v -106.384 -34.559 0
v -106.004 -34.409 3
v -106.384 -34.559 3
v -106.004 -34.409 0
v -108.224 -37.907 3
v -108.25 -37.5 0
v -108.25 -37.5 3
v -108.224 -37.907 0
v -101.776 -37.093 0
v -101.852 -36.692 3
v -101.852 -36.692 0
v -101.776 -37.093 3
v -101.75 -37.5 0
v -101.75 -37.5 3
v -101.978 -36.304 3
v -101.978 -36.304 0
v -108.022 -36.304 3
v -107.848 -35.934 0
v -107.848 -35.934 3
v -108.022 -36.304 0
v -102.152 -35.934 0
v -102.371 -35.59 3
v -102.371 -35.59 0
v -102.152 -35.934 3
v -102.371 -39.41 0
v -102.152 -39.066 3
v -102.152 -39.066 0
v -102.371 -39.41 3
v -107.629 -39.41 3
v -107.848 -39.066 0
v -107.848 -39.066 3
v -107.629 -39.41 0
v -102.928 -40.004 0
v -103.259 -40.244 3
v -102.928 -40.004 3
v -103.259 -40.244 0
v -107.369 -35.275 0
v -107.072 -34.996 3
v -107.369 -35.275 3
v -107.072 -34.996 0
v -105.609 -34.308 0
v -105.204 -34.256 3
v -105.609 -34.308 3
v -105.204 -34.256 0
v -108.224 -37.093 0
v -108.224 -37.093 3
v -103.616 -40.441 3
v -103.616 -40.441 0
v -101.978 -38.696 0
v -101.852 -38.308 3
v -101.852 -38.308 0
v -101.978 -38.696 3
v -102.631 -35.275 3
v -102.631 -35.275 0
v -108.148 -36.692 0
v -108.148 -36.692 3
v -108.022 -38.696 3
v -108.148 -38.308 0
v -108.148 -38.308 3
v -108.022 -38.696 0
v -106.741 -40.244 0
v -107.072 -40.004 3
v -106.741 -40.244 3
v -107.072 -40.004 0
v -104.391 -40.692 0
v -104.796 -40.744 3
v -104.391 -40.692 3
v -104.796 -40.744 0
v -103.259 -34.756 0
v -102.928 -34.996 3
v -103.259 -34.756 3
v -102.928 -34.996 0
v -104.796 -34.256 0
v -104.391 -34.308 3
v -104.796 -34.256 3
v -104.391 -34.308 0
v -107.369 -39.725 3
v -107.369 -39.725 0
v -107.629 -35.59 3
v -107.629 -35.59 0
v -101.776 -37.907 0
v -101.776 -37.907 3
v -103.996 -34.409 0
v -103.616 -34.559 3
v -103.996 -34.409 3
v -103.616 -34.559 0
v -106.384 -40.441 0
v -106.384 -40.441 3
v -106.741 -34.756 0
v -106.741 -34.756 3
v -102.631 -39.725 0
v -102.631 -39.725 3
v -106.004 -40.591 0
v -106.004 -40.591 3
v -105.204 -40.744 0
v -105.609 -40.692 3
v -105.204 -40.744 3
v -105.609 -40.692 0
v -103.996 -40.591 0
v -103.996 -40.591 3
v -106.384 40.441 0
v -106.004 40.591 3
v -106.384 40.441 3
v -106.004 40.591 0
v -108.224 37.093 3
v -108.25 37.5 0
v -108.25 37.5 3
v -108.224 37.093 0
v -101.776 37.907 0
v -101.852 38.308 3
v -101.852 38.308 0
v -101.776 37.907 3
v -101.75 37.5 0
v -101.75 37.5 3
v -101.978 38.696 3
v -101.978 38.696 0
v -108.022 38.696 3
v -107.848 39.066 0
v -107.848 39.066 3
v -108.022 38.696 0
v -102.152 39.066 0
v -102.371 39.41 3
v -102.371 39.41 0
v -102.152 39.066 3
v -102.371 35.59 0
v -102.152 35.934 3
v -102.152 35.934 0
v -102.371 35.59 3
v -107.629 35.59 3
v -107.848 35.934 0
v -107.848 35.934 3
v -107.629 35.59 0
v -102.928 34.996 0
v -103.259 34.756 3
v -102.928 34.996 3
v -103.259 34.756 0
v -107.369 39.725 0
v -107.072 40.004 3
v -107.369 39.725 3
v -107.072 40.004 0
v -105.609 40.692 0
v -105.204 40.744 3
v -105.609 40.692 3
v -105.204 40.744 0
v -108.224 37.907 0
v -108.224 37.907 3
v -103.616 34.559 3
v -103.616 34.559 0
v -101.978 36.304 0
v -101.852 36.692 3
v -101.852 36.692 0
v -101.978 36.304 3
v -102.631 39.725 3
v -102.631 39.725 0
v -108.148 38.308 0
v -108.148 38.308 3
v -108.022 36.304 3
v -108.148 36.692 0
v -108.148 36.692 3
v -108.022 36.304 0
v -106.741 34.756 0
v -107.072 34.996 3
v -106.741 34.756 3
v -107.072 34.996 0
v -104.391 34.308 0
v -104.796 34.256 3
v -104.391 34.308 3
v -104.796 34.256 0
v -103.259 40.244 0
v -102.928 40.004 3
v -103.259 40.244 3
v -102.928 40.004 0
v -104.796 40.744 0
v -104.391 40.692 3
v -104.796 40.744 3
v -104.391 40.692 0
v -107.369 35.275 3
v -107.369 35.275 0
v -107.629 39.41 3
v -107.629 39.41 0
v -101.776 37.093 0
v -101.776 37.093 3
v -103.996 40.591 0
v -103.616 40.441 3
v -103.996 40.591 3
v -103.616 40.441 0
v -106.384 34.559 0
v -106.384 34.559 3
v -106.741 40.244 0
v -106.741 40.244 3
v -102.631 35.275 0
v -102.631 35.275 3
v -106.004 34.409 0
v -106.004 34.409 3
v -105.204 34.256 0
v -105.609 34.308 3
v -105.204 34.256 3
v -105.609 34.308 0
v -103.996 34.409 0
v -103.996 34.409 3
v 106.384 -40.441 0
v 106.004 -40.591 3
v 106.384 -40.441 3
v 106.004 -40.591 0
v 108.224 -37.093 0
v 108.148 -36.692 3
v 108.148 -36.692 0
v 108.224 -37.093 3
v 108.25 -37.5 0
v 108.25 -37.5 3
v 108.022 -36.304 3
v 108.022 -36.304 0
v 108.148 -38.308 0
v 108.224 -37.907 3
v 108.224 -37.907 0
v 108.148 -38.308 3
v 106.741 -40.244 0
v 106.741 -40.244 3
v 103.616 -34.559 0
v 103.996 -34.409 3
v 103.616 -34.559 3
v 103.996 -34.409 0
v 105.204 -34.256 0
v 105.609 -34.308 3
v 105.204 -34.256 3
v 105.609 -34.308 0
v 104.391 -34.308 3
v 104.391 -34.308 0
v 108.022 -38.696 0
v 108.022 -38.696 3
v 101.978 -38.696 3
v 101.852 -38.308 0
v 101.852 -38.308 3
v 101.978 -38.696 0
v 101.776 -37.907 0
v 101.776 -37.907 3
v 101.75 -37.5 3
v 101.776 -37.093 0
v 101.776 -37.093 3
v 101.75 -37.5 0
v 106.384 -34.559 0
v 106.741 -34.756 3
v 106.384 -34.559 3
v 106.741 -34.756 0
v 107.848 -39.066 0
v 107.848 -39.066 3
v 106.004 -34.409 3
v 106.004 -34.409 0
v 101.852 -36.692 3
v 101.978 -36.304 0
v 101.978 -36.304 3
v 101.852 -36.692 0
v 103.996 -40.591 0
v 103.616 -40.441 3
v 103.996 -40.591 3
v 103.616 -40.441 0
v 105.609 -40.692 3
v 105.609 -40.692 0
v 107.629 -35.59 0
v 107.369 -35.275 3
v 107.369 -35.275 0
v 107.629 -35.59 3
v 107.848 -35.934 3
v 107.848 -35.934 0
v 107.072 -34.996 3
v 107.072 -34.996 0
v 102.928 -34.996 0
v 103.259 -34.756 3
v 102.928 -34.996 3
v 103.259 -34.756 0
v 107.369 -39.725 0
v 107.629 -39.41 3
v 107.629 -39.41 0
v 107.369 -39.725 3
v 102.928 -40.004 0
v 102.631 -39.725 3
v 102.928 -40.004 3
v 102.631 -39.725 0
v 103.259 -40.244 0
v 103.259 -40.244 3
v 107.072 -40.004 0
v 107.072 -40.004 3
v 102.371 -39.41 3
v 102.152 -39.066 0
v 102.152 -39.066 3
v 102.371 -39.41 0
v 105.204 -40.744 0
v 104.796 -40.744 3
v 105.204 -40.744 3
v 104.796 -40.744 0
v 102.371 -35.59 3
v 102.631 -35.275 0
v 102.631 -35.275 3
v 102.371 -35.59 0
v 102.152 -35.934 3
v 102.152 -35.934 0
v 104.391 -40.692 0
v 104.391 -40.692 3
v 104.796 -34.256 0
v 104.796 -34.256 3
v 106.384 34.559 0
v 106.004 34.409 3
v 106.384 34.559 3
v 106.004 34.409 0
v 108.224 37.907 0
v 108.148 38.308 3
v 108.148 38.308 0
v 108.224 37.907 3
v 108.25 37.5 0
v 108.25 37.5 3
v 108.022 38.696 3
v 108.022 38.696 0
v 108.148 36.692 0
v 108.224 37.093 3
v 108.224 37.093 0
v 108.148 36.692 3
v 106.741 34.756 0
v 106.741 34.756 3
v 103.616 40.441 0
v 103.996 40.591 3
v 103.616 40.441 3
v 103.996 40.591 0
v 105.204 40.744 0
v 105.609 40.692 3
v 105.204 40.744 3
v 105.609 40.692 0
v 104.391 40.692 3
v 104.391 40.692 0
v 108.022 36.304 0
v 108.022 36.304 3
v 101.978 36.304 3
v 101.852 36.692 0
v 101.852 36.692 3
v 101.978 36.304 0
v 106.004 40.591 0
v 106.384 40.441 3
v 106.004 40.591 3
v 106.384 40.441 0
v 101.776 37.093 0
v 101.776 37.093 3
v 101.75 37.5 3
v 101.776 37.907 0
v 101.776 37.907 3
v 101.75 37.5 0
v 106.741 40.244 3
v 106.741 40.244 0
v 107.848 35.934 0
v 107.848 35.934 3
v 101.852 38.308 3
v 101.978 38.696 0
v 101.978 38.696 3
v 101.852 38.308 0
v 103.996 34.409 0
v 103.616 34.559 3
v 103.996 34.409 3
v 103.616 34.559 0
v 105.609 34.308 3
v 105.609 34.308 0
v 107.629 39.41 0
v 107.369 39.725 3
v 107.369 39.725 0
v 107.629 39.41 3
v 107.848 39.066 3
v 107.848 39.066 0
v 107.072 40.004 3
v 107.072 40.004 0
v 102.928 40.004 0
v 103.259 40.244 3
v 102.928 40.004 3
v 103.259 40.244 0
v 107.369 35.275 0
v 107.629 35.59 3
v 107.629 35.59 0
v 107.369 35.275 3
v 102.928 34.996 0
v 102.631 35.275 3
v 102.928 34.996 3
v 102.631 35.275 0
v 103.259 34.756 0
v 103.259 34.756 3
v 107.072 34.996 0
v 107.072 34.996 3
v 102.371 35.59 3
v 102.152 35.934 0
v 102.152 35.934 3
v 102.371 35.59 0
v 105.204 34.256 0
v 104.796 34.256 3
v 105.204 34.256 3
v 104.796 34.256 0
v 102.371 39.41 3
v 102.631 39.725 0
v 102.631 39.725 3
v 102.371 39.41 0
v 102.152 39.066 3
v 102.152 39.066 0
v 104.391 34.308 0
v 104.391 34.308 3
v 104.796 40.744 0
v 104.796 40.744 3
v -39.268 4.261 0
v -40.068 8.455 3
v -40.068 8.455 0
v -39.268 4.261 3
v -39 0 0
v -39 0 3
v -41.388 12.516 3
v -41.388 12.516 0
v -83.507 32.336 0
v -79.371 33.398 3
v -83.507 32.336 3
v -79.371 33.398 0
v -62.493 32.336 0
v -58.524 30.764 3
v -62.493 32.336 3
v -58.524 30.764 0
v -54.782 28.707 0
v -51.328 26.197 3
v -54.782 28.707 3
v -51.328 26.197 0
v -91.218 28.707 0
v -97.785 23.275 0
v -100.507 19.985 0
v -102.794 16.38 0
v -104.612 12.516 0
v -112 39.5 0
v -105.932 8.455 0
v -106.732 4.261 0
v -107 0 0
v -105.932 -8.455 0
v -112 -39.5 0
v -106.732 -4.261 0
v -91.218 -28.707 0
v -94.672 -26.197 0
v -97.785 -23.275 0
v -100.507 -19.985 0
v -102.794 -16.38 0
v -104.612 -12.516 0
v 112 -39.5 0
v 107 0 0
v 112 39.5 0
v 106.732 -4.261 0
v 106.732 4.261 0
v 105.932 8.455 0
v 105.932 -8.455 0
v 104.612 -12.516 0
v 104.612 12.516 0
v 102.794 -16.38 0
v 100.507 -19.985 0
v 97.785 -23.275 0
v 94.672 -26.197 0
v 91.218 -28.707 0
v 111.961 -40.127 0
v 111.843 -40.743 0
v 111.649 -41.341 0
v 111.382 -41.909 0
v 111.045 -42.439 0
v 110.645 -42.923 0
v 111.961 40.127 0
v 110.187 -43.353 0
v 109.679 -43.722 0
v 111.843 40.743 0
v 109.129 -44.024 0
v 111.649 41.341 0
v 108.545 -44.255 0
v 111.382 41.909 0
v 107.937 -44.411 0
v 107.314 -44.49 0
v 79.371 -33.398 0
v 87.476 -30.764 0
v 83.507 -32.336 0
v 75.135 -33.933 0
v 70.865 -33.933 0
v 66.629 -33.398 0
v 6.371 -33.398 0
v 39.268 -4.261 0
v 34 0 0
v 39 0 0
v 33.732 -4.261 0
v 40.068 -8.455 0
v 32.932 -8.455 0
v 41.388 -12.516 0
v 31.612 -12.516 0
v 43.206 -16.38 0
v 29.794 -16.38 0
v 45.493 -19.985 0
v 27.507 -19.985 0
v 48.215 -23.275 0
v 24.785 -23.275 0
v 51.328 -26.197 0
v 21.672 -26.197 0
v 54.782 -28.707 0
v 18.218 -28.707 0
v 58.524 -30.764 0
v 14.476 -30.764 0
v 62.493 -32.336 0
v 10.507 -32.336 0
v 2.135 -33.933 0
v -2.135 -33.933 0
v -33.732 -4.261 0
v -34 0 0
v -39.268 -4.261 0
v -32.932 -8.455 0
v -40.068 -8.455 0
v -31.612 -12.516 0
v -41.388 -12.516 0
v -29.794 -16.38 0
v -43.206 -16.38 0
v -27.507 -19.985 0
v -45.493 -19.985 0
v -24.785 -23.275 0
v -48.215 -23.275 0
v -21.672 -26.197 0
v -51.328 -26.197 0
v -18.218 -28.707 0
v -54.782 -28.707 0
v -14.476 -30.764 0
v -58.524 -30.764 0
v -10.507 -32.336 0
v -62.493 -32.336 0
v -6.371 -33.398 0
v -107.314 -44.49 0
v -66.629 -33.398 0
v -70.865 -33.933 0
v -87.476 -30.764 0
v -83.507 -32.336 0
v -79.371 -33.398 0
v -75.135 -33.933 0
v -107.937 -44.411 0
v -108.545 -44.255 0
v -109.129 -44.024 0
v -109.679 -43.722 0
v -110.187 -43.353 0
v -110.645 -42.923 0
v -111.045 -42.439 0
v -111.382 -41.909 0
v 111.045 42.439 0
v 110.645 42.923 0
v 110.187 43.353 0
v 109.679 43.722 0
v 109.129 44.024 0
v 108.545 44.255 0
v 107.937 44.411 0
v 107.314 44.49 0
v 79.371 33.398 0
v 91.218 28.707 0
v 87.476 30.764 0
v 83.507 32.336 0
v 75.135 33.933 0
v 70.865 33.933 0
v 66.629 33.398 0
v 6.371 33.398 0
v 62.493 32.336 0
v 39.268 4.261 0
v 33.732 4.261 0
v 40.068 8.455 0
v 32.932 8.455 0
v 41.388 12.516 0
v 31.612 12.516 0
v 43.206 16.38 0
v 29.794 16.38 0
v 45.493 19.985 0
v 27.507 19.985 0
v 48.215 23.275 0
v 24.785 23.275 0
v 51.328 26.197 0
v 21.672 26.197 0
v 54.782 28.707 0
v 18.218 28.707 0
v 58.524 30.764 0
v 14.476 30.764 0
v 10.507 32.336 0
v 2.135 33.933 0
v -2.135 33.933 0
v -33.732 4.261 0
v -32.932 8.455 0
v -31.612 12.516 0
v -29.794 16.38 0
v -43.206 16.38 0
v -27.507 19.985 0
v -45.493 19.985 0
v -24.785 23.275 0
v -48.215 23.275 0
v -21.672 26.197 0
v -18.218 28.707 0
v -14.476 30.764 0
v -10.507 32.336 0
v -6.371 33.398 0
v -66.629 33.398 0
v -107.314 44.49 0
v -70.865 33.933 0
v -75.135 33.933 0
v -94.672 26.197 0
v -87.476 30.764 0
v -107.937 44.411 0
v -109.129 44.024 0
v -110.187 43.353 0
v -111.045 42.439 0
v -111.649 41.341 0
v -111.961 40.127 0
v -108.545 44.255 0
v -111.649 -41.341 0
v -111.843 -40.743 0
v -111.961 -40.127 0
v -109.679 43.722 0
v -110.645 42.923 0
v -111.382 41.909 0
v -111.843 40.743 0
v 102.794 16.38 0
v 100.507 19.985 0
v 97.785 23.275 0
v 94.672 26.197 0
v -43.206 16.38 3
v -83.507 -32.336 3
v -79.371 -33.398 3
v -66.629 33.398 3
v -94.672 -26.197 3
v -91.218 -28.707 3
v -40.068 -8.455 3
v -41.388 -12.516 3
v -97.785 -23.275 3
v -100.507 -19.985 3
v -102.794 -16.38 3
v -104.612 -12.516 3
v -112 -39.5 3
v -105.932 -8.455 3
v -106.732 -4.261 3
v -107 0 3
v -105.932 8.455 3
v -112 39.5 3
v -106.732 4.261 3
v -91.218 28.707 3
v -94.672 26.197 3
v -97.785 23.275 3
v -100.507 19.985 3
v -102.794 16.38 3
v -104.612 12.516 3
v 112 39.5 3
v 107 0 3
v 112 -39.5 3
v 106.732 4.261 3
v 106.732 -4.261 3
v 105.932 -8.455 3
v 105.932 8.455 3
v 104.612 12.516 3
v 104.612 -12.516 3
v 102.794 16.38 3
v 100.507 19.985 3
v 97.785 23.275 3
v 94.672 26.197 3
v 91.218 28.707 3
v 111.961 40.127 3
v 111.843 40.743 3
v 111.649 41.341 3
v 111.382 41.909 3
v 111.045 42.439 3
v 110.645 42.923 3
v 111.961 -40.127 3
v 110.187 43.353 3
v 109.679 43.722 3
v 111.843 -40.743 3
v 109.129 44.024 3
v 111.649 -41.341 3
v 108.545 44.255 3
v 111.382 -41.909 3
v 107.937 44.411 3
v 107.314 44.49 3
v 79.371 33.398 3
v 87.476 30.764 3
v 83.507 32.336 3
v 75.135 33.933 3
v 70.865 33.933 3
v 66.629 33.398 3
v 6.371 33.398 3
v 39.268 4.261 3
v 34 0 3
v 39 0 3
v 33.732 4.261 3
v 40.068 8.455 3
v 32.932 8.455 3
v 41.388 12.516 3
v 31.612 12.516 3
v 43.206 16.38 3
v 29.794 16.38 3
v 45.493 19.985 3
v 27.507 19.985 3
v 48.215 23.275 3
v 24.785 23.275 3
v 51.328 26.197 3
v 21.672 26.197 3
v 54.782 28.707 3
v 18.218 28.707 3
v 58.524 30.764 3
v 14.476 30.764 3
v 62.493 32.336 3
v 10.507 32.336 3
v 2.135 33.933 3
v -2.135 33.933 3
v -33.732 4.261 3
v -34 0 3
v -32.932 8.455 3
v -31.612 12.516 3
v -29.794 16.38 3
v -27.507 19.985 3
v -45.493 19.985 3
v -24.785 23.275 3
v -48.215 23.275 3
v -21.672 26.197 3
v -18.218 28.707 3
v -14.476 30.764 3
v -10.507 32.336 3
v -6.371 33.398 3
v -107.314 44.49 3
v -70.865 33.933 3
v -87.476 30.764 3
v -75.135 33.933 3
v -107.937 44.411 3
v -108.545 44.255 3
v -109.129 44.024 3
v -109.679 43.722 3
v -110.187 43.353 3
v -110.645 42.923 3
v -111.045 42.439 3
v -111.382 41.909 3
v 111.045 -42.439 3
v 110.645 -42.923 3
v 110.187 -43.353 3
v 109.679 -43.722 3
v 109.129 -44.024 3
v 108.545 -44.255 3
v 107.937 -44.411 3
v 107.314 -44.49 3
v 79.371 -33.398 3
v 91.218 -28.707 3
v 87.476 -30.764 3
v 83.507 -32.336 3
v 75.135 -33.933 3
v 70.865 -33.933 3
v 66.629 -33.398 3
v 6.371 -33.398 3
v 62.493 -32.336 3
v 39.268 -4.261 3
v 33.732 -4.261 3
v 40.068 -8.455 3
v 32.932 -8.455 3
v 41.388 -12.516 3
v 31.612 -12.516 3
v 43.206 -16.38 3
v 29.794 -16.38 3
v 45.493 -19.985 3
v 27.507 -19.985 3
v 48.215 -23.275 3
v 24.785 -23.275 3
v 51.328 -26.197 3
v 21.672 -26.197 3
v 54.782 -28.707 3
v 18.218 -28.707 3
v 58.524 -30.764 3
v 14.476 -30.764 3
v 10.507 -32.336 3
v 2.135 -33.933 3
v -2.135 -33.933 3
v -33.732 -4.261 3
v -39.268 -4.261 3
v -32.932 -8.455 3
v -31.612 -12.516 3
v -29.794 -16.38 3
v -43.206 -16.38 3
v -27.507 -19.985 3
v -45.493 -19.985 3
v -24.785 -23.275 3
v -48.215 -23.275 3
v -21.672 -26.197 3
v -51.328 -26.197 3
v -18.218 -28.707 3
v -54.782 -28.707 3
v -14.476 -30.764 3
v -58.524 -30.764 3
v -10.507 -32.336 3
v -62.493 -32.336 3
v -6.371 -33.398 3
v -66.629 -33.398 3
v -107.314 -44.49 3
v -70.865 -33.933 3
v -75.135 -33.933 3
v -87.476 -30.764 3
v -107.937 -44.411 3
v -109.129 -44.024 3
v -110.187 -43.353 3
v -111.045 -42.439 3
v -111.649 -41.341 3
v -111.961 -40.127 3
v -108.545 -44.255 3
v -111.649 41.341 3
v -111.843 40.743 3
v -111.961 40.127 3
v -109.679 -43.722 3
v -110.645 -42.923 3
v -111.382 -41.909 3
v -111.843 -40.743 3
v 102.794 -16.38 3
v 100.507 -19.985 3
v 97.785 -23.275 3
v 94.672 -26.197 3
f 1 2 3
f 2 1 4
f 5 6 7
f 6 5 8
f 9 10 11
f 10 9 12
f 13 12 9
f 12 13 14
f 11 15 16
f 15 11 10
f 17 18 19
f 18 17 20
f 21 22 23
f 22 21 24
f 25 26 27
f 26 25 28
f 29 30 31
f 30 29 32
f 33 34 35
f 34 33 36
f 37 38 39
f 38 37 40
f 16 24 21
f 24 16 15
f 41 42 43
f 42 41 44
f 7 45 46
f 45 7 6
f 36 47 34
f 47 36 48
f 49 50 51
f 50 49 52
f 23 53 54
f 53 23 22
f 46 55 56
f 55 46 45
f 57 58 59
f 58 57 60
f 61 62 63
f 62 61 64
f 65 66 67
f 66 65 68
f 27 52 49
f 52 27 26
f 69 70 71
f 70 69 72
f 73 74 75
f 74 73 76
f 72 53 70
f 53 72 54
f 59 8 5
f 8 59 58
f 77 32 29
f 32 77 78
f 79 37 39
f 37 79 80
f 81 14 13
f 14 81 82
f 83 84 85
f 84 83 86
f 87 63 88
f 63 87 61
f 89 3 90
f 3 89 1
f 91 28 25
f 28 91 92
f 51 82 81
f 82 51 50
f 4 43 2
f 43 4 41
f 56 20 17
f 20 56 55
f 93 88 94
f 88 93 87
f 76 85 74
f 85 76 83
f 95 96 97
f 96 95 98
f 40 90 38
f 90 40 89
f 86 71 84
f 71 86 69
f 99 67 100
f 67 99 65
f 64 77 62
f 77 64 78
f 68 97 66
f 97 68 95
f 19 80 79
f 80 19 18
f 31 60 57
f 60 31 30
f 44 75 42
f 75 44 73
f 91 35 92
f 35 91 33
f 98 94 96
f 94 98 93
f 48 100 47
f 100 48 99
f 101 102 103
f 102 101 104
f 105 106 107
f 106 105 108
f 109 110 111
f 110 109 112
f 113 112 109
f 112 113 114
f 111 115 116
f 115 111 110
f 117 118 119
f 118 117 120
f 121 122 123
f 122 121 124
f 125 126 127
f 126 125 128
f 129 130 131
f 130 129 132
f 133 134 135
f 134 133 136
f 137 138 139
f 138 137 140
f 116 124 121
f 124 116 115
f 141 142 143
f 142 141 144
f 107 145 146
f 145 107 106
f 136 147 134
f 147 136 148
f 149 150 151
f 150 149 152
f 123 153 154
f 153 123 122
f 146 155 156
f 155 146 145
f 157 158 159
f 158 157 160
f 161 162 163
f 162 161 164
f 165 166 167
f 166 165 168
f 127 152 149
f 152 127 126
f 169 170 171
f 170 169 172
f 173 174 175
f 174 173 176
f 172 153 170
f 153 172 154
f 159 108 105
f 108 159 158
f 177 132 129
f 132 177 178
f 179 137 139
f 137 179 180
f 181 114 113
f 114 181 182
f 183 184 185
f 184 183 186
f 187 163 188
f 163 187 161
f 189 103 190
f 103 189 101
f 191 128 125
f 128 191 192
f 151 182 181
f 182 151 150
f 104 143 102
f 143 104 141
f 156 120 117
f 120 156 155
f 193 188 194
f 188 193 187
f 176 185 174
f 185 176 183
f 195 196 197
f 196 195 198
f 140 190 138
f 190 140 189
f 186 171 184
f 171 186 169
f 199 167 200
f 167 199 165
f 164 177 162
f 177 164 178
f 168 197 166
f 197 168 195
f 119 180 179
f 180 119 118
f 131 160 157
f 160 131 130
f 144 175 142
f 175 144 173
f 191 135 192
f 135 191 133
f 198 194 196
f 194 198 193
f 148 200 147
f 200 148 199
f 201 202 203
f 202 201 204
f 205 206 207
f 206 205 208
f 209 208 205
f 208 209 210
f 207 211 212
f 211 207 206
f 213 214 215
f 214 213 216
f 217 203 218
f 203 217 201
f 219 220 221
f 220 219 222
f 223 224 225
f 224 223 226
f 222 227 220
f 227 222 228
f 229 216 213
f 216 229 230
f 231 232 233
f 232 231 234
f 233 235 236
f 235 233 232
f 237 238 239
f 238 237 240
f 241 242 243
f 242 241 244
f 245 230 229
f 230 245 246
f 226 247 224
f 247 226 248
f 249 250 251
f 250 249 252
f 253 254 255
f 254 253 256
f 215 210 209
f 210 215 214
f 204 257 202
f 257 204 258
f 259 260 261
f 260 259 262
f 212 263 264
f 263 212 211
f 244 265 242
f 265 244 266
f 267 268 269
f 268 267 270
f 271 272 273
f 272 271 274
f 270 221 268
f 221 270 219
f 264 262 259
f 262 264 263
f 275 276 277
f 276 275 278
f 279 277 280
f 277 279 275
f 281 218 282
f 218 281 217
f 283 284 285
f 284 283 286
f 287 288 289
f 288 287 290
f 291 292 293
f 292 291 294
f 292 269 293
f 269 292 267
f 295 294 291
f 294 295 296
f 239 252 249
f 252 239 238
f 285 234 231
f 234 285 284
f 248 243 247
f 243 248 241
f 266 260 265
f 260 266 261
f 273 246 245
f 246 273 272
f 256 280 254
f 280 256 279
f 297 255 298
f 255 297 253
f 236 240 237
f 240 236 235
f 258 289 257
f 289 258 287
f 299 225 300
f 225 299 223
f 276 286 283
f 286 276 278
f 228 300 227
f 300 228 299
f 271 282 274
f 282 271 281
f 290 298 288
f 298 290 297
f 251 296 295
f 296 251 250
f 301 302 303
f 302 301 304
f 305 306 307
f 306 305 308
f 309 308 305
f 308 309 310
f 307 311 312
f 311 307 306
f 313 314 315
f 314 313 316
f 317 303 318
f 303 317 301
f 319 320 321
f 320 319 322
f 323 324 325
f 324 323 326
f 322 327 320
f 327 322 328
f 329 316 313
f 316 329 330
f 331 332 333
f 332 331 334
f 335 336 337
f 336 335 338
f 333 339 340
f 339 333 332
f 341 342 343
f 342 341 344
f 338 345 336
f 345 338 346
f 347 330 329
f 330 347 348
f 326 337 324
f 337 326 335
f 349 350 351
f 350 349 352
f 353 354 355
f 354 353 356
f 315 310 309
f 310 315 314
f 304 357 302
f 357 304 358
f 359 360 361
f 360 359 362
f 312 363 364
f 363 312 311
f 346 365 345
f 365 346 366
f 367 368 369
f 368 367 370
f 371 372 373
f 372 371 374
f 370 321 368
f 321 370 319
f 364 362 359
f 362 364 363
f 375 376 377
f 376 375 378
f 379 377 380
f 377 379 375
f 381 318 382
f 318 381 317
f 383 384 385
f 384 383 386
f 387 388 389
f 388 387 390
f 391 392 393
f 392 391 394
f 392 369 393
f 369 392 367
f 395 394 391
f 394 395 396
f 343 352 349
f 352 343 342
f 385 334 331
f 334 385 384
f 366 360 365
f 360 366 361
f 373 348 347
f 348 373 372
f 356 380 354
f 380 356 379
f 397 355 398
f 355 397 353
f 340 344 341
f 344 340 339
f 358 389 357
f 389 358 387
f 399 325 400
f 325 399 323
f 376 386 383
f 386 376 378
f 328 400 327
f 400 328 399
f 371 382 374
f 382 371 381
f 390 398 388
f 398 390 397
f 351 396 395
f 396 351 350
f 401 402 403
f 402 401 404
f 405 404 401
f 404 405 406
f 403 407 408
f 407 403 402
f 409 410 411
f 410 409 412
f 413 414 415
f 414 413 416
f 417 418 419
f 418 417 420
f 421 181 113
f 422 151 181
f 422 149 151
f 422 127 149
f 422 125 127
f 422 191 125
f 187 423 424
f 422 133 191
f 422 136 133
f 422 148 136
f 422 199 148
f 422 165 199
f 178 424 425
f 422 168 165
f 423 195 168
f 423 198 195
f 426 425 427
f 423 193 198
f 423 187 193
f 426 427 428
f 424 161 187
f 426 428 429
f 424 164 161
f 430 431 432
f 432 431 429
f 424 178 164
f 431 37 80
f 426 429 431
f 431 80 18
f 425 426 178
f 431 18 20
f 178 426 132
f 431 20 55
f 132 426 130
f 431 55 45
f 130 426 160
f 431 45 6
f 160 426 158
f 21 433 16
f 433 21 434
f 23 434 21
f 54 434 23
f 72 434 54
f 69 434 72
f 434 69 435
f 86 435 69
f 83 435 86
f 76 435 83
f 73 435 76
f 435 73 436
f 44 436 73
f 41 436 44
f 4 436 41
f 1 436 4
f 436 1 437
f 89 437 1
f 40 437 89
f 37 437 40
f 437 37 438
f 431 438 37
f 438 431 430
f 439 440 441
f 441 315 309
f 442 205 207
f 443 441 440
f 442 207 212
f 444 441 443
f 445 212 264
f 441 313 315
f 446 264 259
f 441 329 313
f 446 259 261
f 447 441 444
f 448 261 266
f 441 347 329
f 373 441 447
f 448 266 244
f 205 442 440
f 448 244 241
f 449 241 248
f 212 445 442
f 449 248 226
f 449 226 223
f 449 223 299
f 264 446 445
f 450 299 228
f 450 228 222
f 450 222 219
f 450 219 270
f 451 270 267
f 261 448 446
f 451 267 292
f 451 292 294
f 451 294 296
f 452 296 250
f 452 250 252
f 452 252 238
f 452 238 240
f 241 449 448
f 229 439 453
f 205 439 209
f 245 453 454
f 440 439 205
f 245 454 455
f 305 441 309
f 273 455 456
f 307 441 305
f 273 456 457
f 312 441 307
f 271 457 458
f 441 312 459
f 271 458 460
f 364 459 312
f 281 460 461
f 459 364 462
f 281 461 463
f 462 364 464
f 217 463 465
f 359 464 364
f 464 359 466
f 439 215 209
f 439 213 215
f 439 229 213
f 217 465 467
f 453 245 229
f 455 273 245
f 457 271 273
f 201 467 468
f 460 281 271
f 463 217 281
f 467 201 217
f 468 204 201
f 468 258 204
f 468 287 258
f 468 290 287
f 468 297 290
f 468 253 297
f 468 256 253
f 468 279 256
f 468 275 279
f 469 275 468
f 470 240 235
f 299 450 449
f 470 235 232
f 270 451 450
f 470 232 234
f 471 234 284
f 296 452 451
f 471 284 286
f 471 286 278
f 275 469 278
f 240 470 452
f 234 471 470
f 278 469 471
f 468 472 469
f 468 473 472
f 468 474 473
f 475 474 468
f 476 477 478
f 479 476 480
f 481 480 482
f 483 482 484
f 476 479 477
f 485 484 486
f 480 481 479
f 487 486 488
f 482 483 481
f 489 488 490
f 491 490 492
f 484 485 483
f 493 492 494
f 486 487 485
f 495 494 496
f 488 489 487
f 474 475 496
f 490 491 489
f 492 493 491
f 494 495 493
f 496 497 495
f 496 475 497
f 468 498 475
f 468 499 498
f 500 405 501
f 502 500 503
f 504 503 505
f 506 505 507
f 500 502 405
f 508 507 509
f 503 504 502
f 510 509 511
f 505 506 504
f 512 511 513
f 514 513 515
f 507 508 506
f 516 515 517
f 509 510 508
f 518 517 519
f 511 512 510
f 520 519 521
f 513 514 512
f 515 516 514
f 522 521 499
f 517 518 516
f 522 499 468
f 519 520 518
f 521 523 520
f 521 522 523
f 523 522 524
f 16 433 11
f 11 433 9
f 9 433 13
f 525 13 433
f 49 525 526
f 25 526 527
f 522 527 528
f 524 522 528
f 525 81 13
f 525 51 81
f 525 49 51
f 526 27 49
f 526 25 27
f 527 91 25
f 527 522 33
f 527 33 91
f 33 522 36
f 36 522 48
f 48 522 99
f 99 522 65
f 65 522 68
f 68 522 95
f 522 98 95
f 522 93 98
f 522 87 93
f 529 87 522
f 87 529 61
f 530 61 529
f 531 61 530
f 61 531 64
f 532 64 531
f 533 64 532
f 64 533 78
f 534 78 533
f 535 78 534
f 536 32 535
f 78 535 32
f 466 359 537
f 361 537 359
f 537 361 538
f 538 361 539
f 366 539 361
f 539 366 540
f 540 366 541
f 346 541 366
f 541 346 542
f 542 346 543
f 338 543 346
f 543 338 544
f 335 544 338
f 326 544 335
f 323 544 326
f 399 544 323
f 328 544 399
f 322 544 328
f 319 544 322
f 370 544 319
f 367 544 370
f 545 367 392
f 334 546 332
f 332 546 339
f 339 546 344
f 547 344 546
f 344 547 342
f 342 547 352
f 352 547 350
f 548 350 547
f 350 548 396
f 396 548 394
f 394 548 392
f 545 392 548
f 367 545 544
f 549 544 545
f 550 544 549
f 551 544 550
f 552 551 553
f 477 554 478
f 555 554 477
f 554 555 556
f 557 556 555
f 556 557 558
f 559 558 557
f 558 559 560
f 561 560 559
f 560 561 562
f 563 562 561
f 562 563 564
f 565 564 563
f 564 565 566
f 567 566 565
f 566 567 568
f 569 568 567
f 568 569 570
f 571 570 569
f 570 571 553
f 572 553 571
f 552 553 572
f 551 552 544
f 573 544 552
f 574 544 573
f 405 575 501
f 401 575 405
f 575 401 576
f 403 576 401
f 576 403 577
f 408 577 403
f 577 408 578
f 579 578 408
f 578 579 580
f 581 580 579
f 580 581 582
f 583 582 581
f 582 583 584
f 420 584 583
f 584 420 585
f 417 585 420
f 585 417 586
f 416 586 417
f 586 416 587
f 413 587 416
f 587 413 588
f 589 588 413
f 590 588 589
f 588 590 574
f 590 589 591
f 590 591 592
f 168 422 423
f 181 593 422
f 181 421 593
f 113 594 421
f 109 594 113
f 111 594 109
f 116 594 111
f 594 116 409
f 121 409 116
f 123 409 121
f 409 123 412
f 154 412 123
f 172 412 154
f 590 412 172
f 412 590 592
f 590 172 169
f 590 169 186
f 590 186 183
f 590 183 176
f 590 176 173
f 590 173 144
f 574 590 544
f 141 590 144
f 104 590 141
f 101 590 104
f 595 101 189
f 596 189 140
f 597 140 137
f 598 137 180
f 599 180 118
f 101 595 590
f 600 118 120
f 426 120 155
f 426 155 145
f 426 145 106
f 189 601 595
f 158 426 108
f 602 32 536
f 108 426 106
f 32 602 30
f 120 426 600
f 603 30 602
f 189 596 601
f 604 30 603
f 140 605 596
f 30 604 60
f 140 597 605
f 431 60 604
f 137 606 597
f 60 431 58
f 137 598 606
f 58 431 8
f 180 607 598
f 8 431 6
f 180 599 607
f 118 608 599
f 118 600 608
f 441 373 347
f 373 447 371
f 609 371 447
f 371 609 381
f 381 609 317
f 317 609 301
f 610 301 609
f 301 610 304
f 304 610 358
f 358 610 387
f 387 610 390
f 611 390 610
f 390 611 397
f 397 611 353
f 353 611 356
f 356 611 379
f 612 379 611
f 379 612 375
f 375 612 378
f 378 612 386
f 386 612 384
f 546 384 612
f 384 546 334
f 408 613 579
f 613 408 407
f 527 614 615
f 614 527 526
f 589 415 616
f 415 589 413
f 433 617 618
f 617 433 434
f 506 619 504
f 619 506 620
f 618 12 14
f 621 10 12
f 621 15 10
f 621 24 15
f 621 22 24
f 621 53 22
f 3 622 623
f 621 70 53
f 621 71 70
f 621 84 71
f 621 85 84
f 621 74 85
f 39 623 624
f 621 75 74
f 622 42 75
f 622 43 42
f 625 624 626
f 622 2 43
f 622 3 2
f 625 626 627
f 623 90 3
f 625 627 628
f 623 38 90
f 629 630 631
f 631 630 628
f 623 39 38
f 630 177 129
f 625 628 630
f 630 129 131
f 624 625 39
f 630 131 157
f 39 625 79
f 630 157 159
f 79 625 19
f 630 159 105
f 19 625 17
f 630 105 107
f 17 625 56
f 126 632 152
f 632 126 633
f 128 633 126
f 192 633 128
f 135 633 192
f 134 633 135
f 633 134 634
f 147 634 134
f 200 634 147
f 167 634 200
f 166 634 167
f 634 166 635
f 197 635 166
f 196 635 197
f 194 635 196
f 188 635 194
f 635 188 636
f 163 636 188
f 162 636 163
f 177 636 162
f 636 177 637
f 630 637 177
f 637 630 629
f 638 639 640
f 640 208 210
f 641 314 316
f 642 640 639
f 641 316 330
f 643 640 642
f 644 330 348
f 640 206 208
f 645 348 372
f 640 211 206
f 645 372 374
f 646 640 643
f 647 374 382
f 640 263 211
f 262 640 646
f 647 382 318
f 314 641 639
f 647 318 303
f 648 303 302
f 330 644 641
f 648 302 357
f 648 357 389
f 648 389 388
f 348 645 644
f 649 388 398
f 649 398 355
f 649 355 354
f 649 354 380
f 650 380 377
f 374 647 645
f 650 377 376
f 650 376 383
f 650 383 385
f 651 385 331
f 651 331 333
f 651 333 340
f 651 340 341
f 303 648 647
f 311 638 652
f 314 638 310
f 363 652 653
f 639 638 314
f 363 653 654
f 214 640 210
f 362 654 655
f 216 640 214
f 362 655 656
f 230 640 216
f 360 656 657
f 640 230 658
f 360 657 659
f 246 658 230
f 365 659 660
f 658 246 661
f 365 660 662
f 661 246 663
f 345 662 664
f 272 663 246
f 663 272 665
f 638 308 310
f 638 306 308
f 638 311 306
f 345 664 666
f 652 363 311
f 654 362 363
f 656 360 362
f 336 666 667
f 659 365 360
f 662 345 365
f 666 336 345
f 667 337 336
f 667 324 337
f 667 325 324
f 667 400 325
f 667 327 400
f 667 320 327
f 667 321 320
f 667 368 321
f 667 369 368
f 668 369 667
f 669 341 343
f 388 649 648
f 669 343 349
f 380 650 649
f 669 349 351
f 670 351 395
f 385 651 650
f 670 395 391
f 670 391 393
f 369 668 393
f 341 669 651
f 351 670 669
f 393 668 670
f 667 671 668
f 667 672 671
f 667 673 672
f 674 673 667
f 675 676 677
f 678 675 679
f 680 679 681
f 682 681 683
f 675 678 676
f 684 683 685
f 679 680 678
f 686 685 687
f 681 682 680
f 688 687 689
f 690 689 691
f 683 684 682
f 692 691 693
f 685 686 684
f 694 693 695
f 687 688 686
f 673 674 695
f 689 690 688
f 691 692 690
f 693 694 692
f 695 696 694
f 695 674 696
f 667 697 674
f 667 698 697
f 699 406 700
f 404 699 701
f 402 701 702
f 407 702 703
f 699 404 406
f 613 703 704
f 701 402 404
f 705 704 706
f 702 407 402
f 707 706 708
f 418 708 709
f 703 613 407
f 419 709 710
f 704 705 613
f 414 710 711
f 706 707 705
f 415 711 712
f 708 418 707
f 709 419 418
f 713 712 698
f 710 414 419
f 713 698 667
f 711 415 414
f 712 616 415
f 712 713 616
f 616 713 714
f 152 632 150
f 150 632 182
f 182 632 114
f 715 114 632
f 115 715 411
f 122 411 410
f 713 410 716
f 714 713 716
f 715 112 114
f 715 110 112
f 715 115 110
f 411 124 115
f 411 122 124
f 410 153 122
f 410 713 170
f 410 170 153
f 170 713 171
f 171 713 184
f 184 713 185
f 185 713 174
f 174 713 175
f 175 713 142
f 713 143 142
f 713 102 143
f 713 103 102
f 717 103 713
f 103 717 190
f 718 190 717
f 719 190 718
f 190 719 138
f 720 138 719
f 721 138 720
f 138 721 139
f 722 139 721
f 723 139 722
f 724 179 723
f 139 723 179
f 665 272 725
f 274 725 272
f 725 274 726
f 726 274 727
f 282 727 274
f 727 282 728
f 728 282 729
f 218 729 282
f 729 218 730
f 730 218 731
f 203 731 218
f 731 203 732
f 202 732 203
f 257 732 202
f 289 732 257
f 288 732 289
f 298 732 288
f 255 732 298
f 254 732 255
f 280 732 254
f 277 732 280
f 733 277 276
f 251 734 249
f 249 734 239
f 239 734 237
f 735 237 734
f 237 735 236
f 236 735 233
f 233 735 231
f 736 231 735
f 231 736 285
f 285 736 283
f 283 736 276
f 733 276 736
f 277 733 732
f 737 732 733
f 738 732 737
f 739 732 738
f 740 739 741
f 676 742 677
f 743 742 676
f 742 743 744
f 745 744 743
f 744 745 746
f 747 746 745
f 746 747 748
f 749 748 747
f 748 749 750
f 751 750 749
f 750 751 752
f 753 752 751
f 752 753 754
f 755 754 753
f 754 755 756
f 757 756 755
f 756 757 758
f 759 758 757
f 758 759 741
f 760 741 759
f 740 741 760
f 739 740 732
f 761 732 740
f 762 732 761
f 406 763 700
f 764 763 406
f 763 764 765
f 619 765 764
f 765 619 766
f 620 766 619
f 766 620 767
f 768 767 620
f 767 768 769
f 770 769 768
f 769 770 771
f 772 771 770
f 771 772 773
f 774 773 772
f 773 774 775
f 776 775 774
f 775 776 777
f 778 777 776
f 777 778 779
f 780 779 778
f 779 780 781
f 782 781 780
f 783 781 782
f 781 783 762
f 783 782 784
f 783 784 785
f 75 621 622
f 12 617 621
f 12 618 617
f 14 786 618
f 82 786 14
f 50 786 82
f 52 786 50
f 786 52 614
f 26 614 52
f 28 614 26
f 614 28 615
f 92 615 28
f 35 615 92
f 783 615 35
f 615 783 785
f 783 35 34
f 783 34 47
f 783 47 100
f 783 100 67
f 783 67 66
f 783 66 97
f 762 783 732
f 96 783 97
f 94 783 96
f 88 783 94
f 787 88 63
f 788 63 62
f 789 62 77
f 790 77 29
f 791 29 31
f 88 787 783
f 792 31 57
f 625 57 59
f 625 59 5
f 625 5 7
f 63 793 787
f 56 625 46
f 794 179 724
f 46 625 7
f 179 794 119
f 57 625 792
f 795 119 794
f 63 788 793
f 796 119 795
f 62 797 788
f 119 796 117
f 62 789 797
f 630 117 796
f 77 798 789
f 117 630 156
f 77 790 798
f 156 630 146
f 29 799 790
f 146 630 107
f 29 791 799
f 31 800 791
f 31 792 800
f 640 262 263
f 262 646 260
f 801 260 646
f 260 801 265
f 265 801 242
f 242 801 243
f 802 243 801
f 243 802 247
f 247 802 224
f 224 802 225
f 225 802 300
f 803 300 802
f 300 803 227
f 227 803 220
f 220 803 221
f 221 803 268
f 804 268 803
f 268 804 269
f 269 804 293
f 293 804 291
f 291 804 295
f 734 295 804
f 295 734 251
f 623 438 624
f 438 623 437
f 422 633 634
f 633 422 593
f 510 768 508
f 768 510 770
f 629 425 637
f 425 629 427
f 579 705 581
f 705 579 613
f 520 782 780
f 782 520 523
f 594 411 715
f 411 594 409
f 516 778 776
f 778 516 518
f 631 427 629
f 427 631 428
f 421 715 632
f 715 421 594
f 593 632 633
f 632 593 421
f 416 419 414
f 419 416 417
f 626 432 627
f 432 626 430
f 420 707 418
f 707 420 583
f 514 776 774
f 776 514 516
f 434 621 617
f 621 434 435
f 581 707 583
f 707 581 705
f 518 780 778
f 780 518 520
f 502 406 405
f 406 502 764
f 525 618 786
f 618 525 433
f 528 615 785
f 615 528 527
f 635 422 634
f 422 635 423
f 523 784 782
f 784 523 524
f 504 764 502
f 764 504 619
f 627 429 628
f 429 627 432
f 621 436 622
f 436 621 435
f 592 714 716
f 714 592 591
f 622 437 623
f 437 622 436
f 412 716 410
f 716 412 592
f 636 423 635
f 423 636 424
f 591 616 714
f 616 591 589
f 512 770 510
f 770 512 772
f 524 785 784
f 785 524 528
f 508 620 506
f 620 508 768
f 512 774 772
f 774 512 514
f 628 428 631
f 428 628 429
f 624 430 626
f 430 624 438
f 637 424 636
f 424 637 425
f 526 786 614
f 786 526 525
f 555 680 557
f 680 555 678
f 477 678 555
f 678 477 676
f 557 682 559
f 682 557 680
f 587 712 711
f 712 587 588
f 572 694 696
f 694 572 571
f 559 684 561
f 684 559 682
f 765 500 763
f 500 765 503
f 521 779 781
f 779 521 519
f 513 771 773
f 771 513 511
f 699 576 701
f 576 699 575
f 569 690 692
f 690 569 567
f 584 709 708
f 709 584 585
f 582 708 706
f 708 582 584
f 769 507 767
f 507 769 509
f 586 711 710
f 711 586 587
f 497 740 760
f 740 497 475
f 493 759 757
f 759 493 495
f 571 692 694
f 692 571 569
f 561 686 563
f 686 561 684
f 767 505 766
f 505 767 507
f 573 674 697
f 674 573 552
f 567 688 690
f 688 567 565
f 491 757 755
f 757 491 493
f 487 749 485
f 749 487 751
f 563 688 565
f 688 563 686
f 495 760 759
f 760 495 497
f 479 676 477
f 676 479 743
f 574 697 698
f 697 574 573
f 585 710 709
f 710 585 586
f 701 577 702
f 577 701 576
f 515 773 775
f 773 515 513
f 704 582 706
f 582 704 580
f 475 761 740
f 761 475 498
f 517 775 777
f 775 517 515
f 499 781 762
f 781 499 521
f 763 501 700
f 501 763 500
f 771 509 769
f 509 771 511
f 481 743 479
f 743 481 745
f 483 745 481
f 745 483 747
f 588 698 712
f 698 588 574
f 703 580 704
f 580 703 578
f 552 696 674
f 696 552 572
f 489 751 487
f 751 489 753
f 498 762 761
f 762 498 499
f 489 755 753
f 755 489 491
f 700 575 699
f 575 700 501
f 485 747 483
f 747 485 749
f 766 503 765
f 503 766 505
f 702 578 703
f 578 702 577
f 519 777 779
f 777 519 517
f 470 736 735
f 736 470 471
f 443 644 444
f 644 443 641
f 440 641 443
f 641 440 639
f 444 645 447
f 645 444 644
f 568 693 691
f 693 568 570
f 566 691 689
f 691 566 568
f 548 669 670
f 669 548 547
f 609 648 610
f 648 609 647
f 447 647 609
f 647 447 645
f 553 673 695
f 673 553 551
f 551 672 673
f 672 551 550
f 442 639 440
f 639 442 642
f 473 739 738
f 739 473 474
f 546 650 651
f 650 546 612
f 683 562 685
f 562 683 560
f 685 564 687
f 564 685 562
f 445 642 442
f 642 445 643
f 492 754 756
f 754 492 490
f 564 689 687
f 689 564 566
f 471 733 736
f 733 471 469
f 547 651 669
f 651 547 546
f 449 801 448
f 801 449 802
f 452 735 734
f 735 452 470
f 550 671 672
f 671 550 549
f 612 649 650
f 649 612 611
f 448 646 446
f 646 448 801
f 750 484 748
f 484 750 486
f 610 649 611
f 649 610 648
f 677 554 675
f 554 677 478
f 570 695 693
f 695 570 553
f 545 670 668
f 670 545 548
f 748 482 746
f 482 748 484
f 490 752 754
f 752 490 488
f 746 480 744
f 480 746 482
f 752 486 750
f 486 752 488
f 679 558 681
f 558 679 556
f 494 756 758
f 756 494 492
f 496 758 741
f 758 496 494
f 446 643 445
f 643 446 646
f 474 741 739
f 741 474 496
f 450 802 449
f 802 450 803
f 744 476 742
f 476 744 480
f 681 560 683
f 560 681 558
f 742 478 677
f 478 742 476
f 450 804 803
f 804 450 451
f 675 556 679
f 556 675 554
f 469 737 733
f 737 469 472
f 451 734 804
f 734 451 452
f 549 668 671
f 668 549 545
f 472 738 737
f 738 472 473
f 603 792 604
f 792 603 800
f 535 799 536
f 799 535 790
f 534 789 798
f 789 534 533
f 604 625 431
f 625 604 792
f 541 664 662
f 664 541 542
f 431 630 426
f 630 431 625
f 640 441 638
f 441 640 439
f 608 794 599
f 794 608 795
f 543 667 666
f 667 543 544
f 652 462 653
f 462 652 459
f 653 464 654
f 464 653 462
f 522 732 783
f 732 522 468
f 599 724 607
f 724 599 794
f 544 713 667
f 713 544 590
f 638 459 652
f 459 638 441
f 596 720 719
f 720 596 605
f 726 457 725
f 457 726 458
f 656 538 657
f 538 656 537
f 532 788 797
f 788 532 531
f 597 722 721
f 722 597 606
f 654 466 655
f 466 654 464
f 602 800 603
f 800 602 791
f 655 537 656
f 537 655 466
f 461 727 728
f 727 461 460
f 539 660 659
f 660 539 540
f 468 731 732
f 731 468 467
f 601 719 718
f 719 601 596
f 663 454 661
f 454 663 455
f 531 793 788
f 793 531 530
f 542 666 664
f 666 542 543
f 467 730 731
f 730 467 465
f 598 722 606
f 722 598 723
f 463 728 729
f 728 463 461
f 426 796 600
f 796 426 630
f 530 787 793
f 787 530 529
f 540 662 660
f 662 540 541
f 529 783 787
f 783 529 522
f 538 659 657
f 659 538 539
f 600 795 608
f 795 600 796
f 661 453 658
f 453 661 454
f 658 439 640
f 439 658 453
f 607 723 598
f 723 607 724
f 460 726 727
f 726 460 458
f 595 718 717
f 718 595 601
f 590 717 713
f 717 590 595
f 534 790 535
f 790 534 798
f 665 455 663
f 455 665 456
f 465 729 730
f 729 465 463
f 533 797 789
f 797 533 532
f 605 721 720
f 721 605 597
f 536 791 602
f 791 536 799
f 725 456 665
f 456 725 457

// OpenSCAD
$fn = 50;


difference() {
	union() {
		hull() {
			translate(v = [-107.0000000000, 39.5000000000, 0]) {
				cylinder(h = 3, r = 5);
			}
			translate(v = [107.0000000000, 39.5000000000, 0]) {
				cylinder(h = 3, r = 5);
			}
			translate(v = [-107.0000000000, -39.5000000000, 0]) {
				cylinder(h = 3, r = 5);
			}
			translate(v = [107.0000000000, -39.5000000000, 0]) {
				cylinder(h = 3, r = 5);
			}
		}
	}
	union() {
		#translate(v = [-105.0000000000, -37.5000000000, -100.0000000000]) {
			cylinder(h = 200, r = 3.2500000000);
		}
		#translate(v = [-105.0000000000, 37.5000000000, -100.0000000000]) {
			cylinder(h = 200, r = 3.2500000000);
		}
		#translate(v = [105.0000000000, -37.5000000000, -100.0000000000]) {
			cylinder(h = 200, r = 3.2500000000);
		}
		#translate(v = [105.0000000000, 37.5000000000, -100.0000000000]) {
			cylinder(h = 200, r = 3.2500000000);
		}
		#translate(v = [-73.0000000000, 0, 0]) {
			cylinder(h = 3, r = 34.0000000000);
		}
		#cylinder(h = 3, r = 34.0000000000);
		#translate(v = [73.0000000000, 0, 0]) {
			cylinder(h = 3, r = 34.0000000000);
		}
	}
}
